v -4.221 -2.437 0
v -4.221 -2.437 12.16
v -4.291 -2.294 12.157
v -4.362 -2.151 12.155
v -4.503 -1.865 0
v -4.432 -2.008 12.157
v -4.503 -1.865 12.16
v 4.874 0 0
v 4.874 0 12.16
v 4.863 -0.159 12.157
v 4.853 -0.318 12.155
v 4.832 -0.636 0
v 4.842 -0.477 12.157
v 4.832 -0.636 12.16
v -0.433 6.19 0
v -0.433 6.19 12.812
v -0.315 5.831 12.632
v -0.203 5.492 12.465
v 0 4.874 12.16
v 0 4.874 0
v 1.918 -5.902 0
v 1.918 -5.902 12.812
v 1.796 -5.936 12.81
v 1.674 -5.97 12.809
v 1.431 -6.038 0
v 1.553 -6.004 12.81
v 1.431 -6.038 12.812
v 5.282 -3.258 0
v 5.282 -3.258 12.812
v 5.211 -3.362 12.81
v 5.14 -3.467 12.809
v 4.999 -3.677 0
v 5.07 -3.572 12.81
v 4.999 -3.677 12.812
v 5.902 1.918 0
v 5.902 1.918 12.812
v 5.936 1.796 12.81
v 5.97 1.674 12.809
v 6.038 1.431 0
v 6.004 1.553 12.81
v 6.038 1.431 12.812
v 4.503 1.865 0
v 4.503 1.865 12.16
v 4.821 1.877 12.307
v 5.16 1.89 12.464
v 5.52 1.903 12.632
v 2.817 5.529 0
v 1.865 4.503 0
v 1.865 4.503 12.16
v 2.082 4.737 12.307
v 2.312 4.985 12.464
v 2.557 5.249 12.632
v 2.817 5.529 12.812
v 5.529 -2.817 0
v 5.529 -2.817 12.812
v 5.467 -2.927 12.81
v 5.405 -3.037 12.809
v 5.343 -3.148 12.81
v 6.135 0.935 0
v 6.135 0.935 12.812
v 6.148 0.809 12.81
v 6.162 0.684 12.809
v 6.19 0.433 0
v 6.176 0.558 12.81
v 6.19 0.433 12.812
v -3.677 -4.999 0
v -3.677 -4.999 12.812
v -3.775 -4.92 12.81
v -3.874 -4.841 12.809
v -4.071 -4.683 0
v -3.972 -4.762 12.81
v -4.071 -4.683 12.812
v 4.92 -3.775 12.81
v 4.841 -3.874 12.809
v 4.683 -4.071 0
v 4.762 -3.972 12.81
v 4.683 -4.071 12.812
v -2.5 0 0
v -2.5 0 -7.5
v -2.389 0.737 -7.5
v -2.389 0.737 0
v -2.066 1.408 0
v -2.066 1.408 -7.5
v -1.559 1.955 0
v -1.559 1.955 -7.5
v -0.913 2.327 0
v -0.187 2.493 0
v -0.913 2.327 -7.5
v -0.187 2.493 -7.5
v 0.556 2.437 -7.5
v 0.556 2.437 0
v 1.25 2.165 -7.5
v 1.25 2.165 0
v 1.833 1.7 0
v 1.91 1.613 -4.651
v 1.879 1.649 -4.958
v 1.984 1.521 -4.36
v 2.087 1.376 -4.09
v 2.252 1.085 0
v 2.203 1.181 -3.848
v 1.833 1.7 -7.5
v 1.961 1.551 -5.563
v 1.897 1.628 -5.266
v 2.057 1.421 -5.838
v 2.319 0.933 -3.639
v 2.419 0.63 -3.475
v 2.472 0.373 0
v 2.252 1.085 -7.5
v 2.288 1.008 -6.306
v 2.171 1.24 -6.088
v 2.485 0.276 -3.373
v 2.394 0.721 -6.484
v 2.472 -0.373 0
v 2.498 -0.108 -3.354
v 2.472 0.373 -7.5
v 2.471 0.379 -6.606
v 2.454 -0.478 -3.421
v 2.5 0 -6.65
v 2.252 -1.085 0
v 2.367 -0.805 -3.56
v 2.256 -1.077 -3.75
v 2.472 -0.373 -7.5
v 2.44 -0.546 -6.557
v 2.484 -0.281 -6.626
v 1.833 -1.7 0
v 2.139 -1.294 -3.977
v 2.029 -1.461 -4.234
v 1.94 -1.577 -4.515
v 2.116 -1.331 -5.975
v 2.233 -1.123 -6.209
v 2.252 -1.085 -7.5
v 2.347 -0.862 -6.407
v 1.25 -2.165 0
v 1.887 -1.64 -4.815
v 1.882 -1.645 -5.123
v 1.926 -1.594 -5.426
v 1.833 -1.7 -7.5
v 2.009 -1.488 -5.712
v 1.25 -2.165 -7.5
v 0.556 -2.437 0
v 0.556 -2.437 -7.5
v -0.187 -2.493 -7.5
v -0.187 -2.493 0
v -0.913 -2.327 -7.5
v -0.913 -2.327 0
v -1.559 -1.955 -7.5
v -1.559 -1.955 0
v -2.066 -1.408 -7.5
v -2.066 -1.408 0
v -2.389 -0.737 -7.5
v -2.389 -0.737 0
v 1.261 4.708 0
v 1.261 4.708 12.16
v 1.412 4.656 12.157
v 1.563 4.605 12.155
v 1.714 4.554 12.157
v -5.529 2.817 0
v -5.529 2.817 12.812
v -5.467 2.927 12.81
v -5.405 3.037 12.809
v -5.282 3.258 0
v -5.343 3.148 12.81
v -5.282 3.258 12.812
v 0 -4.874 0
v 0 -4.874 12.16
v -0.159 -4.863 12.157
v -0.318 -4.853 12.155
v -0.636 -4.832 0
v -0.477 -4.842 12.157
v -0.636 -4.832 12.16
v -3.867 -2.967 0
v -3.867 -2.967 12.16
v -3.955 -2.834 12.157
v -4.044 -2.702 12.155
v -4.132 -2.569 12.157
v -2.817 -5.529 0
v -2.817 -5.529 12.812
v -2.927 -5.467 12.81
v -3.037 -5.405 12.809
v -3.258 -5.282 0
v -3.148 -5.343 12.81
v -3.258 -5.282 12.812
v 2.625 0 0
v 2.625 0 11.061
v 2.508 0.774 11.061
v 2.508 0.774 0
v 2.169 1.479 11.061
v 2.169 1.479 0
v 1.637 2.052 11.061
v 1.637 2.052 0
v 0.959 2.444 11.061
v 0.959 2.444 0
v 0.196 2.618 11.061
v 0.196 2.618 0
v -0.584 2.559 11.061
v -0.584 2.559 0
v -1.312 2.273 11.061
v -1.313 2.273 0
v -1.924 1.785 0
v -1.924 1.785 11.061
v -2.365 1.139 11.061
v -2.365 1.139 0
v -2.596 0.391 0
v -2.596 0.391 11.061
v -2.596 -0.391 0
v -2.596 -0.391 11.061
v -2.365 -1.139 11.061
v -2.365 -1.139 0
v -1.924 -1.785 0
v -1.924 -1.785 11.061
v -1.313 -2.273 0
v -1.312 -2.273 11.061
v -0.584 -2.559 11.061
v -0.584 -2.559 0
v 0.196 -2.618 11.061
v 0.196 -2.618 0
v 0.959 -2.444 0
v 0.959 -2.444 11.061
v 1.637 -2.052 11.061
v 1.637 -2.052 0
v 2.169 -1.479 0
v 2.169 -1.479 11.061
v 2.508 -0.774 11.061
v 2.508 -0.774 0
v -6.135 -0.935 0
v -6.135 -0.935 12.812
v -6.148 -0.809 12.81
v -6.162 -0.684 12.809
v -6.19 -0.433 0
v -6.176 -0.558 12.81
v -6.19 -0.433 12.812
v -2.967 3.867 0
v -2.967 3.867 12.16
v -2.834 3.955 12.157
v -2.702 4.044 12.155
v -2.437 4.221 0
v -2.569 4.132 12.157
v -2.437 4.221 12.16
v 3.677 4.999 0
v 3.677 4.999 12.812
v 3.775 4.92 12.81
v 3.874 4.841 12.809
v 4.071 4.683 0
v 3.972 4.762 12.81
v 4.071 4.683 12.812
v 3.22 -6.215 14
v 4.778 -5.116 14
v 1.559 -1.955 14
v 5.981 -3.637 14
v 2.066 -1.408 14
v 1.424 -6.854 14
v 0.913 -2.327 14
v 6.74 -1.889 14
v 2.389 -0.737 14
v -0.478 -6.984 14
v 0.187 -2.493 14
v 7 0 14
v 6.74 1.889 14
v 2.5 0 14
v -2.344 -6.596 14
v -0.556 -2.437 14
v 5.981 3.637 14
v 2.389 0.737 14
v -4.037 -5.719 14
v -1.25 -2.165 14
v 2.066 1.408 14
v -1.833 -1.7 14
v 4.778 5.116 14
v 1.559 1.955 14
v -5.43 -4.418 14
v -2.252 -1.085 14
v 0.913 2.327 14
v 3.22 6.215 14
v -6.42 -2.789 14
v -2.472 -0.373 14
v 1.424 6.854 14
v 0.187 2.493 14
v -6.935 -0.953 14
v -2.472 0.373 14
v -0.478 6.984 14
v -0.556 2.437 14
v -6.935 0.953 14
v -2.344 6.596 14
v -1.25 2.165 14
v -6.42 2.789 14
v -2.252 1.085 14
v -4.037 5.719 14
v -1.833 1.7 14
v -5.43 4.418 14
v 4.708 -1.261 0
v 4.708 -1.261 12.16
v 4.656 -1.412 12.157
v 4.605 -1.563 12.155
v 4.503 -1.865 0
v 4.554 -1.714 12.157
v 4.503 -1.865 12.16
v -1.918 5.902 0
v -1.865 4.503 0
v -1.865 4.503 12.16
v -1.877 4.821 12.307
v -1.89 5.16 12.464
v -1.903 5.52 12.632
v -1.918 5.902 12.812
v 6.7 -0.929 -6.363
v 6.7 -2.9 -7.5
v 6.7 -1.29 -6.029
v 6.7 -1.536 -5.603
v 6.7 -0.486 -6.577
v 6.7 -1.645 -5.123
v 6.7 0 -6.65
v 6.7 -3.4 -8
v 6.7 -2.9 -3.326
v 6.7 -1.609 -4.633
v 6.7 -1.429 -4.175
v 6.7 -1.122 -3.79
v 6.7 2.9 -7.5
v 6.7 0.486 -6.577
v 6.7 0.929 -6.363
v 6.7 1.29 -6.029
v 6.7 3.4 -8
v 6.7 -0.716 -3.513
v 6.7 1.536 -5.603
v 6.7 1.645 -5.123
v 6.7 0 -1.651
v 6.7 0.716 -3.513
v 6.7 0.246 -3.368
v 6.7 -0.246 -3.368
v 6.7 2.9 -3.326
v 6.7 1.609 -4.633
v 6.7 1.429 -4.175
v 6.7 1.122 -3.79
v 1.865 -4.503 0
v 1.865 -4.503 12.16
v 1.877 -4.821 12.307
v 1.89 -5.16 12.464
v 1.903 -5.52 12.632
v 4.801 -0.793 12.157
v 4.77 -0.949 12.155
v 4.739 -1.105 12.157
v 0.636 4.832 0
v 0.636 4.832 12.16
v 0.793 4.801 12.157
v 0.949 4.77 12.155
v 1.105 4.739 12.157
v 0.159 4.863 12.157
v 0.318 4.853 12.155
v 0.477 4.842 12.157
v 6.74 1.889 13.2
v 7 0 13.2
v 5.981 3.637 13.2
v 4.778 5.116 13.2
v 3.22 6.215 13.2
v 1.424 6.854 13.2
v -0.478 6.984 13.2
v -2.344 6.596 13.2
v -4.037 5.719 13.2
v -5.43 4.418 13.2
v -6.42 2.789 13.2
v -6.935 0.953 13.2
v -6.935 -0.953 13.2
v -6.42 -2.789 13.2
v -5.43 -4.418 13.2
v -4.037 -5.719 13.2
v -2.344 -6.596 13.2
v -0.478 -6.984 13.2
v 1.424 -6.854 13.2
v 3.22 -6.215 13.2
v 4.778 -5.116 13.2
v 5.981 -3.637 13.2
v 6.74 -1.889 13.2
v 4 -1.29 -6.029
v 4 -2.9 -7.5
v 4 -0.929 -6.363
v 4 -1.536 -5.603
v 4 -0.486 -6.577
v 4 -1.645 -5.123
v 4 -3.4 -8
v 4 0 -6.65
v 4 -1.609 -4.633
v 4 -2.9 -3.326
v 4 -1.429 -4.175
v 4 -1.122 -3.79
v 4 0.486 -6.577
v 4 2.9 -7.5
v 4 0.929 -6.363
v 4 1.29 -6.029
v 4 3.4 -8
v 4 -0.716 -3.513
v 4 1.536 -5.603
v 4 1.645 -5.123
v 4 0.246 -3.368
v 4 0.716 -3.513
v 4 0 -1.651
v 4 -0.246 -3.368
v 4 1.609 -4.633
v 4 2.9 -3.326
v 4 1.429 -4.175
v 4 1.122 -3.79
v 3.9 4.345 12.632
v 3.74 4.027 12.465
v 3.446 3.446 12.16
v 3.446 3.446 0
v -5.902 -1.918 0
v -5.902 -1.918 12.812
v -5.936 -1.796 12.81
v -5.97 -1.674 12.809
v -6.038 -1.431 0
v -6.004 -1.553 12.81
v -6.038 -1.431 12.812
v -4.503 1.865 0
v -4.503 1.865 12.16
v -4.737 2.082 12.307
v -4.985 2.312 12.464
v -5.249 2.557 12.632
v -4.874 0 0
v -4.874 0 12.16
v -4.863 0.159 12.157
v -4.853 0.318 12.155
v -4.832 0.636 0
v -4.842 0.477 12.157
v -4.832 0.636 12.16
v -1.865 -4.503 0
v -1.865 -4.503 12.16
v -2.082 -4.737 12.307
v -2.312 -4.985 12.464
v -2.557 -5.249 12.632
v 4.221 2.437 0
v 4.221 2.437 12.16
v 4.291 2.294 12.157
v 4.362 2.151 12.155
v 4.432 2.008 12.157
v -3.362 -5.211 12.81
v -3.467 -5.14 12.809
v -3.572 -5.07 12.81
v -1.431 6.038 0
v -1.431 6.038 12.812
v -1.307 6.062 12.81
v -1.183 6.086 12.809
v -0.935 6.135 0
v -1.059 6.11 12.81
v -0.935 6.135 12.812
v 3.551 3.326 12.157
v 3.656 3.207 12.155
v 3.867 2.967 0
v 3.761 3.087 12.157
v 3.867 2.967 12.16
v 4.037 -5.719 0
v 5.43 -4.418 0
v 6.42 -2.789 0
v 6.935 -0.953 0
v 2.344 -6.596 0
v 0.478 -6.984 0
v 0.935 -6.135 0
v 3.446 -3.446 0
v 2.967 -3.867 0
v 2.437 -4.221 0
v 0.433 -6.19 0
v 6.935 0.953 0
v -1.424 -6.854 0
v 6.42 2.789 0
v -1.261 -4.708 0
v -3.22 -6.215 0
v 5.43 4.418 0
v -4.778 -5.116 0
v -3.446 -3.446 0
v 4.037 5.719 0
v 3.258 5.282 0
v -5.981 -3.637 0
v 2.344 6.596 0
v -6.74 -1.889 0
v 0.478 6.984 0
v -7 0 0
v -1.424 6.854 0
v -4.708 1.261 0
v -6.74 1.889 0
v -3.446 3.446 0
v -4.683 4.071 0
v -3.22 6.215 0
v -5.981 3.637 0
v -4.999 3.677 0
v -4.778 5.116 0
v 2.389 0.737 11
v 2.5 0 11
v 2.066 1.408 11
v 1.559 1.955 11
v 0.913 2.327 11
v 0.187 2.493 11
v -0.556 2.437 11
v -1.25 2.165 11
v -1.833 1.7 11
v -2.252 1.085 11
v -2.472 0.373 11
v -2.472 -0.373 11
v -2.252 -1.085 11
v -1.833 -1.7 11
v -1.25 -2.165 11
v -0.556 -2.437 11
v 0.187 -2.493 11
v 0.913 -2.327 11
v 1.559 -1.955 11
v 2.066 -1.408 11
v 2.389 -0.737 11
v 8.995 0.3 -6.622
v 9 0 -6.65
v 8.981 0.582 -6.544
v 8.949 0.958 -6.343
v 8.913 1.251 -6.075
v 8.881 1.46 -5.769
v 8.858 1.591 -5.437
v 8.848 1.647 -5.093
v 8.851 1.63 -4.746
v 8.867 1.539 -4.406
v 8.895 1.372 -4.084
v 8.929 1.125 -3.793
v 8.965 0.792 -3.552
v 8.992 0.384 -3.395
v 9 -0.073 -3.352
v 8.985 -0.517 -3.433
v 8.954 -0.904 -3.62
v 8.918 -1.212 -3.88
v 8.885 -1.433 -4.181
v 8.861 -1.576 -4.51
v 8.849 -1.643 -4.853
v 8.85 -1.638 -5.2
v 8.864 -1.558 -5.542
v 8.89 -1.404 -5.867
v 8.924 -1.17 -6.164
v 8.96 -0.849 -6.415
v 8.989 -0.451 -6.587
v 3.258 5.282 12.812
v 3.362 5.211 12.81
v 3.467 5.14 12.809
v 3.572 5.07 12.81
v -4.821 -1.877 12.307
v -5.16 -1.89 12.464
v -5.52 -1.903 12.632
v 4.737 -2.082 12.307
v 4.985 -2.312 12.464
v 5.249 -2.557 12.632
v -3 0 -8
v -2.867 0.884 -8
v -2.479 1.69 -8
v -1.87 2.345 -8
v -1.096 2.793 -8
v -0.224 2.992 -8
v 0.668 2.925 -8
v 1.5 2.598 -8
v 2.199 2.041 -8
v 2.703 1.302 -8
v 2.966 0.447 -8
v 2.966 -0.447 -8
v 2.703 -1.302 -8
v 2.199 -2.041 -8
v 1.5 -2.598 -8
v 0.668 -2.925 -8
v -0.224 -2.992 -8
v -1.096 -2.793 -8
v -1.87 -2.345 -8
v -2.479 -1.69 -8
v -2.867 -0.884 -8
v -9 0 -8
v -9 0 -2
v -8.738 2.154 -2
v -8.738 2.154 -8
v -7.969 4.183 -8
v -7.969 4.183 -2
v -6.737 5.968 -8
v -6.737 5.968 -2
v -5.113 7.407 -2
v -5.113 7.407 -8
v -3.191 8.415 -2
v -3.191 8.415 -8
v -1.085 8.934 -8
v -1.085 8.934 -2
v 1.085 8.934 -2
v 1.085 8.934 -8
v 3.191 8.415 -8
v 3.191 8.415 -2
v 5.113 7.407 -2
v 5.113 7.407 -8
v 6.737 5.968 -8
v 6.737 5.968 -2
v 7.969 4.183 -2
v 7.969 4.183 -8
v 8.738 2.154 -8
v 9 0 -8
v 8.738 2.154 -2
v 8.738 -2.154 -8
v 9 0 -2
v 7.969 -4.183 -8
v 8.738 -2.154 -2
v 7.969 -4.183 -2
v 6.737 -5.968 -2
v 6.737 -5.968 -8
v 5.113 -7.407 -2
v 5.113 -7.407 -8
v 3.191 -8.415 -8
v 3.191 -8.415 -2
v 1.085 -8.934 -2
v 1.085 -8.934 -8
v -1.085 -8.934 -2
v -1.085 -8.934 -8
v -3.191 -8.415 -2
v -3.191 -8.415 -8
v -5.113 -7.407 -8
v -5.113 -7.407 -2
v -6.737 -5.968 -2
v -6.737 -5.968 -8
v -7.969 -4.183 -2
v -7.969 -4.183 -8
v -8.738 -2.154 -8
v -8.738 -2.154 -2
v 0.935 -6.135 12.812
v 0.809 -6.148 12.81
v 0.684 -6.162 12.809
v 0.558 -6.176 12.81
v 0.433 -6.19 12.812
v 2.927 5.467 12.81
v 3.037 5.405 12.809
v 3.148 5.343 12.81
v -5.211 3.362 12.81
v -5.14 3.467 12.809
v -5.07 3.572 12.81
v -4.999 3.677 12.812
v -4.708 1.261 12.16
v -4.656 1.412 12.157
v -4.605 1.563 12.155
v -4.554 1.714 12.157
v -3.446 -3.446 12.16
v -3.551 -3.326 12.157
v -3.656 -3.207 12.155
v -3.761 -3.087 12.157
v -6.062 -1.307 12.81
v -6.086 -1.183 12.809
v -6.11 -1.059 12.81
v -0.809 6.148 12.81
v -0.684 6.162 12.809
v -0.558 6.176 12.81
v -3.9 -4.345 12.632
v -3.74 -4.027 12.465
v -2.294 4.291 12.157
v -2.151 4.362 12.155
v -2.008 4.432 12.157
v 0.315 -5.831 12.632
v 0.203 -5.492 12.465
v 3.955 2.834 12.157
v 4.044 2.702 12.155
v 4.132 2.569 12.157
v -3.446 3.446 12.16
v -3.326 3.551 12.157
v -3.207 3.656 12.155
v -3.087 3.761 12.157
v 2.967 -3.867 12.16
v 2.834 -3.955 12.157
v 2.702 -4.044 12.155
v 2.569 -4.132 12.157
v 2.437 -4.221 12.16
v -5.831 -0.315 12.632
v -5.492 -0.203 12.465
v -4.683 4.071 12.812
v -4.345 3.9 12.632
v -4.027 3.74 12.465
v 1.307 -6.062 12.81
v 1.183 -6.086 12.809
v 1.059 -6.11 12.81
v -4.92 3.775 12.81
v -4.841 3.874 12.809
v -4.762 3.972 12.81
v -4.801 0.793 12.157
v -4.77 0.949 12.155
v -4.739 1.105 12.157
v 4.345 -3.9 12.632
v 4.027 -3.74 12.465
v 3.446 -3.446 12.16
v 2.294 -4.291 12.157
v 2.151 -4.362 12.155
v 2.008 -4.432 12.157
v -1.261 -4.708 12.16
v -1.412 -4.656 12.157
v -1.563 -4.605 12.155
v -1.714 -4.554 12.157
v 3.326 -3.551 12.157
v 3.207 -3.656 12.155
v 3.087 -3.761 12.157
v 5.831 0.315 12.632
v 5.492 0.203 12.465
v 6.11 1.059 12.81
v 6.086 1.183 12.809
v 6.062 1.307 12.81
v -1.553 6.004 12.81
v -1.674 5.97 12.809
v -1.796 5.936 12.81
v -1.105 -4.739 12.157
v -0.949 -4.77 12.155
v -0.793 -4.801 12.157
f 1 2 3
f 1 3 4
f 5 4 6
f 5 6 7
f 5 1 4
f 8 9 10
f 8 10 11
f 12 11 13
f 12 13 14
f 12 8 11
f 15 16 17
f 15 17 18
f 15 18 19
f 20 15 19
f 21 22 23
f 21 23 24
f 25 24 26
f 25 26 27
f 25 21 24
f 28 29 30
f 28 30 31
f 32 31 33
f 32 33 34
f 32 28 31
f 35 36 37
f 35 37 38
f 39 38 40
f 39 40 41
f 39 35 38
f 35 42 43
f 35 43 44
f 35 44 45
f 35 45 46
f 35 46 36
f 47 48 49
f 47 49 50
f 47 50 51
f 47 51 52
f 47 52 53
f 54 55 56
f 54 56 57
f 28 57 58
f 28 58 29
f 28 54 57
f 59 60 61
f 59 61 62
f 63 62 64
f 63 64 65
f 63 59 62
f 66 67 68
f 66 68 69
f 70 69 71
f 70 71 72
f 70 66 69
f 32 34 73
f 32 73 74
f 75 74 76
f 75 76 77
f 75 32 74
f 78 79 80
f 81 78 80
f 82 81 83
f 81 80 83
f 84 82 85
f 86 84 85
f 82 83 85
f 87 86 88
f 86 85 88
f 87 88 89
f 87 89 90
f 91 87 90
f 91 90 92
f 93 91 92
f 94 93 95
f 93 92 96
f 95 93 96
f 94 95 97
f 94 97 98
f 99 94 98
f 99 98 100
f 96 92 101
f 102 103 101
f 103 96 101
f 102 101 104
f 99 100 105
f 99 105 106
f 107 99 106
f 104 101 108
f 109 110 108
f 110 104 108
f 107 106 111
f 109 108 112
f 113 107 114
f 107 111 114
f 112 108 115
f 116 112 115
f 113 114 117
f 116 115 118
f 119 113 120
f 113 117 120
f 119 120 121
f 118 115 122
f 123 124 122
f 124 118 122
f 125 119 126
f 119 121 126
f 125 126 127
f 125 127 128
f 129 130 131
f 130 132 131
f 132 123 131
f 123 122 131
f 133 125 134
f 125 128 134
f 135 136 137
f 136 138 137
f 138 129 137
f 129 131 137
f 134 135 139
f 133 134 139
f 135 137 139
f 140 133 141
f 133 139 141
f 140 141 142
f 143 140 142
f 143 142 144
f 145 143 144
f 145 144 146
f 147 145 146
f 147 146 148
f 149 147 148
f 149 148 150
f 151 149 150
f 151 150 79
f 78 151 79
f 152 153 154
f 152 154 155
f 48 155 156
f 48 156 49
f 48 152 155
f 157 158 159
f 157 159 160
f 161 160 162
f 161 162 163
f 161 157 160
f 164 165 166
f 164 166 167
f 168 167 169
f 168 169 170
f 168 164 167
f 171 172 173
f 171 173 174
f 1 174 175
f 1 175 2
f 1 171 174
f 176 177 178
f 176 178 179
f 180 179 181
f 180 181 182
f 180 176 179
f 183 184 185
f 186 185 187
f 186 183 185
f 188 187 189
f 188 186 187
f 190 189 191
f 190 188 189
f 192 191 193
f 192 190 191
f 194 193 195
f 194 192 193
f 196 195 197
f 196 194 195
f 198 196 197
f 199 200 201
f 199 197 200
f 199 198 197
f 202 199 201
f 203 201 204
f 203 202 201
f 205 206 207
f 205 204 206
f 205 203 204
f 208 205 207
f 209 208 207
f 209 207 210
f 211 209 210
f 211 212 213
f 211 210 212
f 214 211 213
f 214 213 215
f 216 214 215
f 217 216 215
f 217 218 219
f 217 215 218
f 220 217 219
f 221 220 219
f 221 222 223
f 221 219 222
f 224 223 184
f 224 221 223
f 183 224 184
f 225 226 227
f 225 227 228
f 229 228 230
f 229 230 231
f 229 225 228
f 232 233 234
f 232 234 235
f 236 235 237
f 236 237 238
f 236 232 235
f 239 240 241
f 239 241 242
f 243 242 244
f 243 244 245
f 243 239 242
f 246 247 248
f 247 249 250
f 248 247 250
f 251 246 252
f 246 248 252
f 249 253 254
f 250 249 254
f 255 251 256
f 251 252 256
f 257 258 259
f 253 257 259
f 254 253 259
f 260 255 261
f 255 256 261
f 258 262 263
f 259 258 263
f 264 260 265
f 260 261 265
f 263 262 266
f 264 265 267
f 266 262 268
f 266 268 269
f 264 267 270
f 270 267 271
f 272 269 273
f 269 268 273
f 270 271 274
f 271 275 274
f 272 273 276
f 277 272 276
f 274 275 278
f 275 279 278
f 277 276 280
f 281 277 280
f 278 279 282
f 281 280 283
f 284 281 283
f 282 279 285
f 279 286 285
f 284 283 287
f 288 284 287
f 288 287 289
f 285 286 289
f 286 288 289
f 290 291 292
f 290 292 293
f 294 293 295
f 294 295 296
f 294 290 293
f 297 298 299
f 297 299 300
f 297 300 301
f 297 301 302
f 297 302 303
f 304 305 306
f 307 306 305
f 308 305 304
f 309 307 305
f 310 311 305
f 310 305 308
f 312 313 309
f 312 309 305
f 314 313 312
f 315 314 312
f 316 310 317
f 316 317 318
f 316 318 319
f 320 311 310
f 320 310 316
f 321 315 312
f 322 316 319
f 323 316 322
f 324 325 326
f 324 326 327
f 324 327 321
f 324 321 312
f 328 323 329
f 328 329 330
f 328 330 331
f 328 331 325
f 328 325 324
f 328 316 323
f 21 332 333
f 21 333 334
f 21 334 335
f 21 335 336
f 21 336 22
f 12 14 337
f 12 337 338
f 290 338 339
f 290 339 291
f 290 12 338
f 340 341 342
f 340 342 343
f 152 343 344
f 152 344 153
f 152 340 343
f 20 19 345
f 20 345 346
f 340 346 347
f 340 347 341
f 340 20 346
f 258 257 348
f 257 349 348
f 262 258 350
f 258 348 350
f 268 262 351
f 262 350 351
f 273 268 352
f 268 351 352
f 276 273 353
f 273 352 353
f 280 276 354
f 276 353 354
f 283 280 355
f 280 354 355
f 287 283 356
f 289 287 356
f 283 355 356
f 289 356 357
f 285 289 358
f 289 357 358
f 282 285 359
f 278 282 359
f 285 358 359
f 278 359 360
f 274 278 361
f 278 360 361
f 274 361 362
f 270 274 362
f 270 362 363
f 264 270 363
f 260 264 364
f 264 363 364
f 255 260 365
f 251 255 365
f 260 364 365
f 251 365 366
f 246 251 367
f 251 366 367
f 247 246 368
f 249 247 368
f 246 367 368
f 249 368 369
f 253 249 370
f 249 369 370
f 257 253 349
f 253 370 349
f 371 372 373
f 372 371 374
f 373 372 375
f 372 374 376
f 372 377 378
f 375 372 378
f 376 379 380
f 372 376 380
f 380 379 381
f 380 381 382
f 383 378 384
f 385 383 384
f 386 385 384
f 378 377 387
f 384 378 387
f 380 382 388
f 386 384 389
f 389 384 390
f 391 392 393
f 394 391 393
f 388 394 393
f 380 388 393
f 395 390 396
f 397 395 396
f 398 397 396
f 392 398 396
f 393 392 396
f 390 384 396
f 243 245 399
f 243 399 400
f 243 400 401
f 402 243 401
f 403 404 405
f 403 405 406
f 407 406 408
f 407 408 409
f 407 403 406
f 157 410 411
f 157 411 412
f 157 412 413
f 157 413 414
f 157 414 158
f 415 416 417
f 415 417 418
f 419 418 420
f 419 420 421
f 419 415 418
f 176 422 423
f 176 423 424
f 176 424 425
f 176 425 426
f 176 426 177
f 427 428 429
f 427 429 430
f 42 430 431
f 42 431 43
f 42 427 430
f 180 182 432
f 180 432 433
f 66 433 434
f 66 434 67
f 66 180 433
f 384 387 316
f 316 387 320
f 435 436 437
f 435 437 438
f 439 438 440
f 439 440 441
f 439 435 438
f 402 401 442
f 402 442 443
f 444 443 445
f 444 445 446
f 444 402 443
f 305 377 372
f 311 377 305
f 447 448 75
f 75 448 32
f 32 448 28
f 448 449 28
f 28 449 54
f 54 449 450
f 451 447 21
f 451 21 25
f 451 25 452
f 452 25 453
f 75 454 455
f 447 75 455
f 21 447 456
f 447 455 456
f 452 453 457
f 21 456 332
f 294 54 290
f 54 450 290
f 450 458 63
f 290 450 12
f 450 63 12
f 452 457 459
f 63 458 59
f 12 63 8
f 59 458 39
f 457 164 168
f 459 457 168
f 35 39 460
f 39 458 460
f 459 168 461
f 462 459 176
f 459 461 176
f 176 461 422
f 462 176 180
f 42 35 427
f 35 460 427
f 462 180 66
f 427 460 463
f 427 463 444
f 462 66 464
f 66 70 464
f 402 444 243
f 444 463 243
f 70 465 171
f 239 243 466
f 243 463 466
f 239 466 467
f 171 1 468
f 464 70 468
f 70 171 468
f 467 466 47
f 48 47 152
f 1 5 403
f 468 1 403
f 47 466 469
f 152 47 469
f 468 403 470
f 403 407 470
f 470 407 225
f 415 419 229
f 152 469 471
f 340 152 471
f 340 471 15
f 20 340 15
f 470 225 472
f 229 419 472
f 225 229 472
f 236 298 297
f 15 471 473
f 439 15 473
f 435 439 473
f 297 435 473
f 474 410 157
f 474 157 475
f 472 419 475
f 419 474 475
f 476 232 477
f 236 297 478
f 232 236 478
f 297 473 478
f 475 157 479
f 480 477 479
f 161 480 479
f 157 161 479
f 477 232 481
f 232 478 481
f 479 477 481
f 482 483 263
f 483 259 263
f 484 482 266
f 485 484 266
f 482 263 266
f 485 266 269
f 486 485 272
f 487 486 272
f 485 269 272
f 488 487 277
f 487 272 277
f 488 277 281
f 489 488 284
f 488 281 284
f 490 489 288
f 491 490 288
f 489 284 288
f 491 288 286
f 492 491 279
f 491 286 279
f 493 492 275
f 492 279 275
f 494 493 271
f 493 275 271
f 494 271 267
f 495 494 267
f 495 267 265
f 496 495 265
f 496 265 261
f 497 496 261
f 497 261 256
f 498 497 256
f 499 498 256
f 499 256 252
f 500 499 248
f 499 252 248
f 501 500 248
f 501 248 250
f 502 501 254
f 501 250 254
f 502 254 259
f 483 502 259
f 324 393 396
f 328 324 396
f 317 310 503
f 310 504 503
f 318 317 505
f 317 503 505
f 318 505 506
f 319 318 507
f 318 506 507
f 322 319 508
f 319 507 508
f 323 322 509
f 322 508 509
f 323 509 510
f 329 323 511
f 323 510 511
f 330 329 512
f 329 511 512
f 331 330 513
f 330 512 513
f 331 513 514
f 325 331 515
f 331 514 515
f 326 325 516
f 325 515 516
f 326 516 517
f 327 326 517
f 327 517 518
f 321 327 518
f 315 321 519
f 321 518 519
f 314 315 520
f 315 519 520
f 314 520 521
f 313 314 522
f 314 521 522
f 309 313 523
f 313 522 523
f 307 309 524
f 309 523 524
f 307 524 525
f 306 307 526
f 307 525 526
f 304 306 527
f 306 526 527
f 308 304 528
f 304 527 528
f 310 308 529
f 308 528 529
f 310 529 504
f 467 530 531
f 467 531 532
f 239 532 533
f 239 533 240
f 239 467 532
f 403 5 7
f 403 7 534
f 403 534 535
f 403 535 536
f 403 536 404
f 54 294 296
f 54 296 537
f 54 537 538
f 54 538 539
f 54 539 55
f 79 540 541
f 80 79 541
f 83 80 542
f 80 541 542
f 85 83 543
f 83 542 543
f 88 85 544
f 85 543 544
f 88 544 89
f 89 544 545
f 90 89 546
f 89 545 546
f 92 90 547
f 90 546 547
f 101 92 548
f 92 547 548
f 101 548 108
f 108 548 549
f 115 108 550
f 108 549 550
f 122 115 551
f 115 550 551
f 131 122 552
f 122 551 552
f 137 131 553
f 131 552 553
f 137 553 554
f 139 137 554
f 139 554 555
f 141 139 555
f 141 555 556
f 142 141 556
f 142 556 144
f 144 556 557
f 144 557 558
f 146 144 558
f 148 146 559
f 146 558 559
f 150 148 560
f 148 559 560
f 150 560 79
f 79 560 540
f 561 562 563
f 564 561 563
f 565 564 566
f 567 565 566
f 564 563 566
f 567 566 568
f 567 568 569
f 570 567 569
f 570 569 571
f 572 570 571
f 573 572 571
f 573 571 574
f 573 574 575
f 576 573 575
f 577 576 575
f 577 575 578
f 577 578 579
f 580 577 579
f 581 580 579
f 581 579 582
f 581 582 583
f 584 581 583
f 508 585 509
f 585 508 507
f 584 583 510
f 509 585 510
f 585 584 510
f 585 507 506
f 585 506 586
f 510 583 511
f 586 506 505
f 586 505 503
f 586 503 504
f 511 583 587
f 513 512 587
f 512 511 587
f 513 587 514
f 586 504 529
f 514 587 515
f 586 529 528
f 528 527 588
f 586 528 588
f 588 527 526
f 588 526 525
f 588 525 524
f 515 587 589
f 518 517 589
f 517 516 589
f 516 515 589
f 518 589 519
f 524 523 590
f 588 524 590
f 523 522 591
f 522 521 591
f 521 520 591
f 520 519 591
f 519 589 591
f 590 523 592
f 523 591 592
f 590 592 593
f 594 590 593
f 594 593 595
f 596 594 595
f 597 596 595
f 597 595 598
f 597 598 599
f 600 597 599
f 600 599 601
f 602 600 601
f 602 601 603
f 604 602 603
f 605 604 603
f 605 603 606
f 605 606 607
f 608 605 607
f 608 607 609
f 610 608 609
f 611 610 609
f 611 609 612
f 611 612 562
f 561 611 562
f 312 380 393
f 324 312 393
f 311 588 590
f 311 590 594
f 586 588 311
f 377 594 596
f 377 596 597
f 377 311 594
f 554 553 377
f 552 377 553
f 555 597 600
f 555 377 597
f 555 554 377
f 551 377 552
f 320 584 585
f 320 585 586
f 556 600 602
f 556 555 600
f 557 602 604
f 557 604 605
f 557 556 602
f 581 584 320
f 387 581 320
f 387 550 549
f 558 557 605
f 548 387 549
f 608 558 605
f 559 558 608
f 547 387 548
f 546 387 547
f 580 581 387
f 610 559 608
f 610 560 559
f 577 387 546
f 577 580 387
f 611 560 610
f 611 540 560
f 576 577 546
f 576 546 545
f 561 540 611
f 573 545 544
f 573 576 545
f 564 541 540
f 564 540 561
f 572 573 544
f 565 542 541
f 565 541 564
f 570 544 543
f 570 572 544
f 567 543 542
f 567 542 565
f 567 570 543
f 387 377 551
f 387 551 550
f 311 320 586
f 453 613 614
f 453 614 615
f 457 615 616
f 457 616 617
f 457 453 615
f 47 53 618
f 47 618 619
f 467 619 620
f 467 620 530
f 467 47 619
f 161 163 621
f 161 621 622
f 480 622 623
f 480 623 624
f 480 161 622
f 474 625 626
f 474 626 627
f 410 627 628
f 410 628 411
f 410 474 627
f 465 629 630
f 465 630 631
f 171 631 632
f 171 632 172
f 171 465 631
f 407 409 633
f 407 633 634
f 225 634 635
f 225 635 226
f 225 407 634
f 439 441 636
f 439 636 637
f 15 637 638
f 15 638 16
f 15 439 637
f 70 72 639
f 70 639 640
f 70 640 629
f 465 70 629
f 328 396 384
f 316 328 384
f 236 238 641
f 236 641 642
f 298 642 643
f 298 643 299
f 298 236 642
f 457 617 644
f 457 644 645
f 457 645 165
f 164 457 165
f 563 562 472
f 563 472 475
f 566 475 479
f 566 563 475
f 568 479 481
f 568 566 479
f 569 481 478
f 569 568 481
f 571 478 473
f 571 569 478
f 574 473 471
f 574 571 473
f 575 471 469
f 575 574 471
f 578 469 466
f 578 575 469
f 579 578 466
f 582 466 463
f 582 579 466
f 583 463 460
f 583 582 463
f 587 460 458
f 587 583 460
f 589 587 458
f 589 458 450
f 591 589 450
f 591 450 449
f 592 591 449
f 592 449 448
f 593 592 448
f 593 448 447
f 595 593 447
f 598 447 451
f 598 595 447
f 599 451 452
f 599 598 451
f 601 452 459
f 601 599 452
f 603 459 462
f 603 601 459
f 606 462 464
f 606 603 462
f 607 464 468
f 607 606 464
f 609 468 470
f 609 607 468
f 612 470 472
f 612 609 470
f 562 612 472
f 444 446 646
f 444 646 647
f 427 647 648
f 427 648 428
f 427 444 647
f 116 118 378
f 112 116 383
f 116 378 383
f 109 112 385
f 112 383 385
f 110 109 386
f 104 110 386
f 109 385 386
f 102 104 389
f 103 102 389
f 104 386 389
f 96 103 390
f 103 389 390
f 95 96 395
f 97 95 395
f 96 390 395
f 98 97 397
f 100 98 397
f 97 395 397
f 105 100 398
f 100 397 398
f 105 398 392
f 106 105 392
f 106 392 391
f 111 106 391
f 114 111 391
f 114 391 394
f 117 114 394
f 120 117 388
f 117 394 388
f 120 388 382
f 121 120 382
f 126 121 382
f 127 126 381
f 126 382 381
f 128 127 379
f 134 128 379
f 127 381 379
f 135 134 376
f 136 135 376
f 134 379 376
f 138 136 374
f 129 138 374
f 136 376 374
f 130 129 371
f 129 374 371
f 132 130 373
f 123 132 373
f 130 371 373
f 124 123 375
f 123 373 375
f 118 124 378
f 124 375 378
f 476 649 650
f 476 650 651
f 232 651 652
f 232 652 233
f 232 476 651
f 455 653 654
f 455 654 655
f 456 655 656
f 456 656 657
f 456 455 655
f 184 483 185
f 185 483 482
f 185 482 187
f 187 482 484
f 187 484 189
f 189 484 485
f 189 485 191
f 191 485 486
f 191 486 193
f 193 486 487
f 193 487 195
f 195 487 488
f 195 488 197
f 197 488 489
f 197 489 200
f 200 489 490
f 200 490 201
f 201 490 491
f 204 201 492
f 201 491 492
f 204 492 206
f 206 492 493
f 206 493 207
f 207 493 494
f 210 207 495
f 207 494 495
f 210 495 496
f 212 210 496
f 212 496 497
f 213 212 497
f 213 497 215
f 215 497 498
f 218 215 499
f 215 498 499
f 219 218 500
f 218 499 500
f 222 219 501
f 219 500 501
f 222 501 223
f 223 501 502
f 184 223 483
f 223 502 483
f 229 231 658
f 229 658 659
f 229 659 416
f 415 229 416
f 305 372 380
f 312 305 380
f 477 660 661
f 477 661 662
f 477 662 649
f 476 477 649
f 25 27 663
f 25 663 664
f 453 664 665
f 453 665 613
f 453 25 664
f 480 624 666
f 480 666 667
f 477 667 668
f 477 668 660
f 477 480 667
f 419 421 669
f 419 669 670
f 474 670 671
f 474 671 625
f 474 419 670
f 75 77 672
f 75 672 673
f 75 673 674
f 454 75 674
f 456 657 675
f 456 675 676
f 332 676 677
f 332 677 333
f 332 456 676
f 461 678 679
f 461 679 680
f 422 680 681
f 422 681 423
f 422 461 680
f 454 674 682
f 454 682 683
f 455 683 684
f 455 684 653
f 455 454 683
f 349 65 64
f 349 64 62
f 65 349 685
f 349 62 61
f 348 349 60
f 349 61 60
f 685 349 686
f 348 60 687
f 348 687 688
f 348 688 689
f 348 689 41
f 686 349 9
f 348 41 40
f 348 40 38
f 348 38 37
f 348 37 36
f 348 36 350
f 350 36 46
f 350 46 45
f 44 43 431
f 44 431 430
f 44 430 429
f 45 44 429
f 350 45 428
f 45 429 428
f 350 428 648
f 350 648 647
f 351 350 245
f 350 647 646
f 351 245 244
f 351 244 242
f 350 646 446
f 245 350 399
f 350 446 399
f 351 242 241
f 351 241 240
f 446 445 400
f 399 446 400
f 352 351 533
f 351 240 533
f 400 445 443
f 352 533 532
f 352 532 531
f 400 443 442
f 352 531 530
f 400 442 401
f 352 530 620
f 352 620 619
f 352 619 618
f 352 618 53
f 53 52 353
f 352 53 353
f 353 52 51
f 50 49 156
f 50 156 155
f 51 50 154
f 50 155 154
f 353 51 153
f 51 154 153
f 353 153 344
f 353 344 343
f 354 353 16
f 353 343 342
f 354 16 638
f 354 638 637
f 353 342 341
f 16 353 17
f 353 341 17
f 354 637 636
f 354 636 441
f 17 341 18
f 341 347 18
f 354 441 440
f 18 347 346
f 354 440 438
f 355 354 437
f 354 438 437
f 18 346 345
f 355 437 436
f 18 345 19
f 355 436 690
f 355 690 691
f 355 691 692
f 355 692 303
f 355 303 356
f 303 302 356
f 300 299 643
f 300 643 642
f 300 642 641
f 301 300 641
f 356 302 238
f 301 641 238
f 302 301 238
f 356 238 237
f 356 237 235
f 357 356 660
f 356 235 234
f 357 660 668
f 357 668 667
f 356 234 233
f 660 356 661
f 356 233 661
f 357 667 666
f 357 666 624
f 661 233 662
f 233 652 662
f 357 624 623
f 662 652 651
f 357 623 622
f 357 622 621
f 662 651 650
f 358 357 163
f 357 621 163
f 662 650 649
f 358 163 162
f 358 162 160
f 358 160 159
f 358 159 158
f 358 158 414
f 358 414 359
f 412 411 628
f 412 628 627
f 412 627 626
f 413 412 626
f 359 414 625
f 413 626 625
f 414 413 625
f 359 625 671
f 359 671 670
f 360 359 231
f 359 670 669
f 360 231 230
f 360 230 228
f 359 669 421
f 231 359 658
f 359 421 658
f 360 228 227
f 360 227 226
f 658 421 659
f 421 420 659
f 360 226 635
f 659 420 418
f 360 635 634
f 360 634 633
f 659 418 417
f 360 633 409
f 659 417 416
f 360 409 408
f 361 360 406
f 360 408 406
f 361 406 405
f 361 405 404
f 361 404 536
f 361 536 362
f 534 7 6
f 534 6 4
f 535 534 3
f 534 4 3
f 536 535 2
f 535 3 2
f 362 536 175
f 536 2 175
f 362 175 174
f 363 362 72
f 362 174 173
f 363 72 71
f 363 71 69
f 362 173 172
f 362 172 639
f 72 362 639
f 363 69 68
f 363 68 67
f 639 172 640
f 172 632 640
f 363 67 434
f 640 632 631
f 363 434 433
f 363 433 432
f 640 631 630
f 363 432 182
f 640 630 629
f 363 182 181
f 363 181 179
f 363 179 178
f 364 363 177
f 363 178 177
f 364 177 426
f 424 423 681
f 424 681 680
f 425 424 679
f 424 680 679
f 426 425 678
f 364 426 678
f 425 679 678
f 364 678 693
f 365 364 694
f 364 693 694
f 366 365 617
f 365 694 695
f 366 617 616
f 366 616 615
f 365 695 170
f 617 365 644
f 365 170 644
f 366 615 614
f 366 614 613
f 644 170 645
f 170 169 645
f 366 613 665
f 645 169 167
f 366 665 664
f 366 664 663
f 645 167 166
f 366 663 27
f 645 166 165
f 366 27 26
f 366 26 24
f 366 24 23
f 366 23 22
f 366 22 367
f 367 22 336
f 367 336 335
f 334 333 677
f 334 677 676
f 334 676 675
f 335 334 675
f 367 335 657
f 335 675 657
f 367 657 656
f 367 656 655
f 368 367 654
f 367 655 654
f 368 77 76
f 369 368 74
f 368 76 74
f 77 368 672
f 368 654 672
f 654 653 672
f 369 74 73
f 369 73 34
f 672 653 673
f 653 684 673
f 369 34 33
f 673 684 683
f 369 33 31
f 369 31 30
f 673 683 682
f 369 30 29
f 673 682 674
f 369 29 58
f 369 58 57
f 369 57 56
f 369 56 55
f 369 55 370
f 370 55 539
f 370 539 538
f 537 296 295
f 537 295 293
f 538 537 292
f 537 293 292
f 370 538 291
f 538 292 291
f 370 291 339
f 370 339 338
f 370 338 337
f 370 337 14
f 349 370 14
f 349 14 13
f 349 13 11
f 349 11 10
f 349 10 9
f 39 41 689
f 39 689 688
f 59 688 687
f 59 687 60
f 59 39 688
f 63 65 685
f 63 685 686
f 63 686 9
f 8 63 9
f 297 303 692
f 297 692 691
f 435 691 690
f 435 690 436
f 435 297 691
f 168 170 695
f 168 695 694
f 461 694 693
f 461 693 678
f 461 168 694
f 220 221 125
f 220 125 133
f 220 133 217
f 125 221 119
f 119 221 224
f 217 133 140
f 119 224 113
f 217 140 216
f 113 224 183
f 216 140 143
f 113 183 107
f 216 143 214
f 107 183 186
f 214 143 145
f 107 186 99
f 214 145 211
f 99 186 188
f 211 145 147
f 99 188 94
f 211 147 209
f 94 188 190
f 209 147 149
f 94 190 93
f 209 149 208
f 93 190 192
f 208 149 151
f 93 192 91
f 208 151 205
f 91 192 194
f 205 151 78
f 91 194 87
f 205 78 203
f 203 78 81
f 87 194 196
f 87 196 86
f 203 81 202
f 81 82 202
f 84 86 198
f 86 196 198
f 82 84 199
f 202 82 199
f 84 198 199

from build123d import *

# Parameters (mm, degrees)
SKETCH2_R           = 2.625
BOSS_EXTRUDE1_DEPTH = 14
SKETCH3_R           = 9
BOSS_EXTRUDE2_DEPTH = 8
SKETCH4_R           = 2.5
CUT_EXTRUDE1_DEPTH  = 23
CHAMFER1_SIZE       = 2
CUT_EXTRUDE2_DEPTH  = 2.7
CUT_EXTRUDE3_REACH  = 20
SKETCH7_R           = 1.65
CHAMFER2_SIZE       = 0.5
CHAMFER3_SIZE       = 0.5


with BuildPart() as part:
    # Sketch2 → Boss-Extrude1 (new body)
    with BuildSketch(Plane.XY):
        Polygon((4.873707771, 0), (4.832012177, -0.636146486), (4.707640171, -1.261407971), (4.502718925, -1.865087032), (5.52904892, -2.817190886), (5.281517029, -3.257688046), (4.998967171, -3.676585913), (4.683272839, -4.071106911), (3.44623208, -3.44623208), (2.966924906, -3.866571903), (2.436853886, -4.2207551), (1.865087032, -4.502718925), (1.917572975, -5.901682854), (1.431063056, -6.038129807), (0.935064673, -6.134541988), (0.432866603, -6.190280914), (0, -4.873707771), (-0.636146486, -4.832012177), (-1.261407971, -4.707640171), (-1.865087032, -4.502718925), (-2.817190886, -5.52904892), (-3.257688046, -5.281517029), (-3.676585913, -4.998967171), (-4.071106911, -4.683272839), (-3.44623208, -3.44623208), (-3.866571903, -2.966924906), (-4.2207551, -2.436853886), (-4.502718925, -1.865087032), (-5.901682854, -1.917572975), (-6.038129807, -1.431063056), (-6.134541988, -0.935064673), (-6.190280914, -0.432866603), (-4.873707771, 0), (-4.832012177, 0.636146486), (-4.707640171, 1.261407971), (-4.502718925, 1.865087032), (-5.52904892, 2.817190886), (-5.281517029, 3.257688046), (-4.998967171, 3.676585913), (-4.683272839, 4.071106911), (-3.44623208, 3.44623208), (-2.966924906, 3.866571903), (-2.436853886, 4.2207551), (-1.865087032, 4.502718925), (-1.917572975, 5.901682854), (-1.431063056, 6.038129807), (-0.935064673, 6.134541988), (-0.432866603, 6.190280914), (0, 4.873707771), (0.636146486, 4.832012177), (1.261407971, 4.707640171), (1.865087032, 4.502718925), (2.817190886, 5.52904892), (3.257688046, 5.281517029), (3.676585913, 4.998967171), (4.071106911, 4.683272839), (3.44623208, 3.44623208), (3.866571903, 2.966924906), (4.2207551, 2.436853886), (4.502718925, 1.865087032), (5.901682854, 1.917572975), (6.038129807, 1.431063056), (6.134541988, 0.935064673), (6.190280914, 0.432866603), align=None)
        Circle(SKETCH2_R, mode=Mode.SUBTRACT)
    extrude(amount=BOSS_EXTRUDE1_DEPTH)

    # Sketch3 → Boss-Extrude2 (add)
    with BuildSketch(Plane(origin=(0, 0, 0), x_dir=(-1, 0, 0), z_dir=(0, 0, -1))):
        Circle(SKETCH3_R)
    extrude(amount=BOSS_EXTRUDE2_DEPTH)

    # Sketch4 → Cut-Extrude1 (cut, through all)
    with BuildSketch(Plane(origin=(0, 0, -8), x_dir=(-1, 0, 0), z_dir=(0, 0, -1))):
        Circle(SKETCH4_R)
    extrude(amount=-CUT_EXTRUDE1_DEPTH, mode=Mode.SUBTRACT)

    # Sketch5 → Revolve1 (revolve)
    with BuildSketch(Plane(origin=(0, 0, 0), x_dir=(1, 0, 0), z_dir=(0, 1, 0))):
        Polygon((2.5, -14), (7, -14), (7, -13.2), (2.5, -11), align=None)
    revolve(axis=Axis((0, 0, 0), (0, 0, 1)))

    # Chamfer1
    chamfer1_edges = [part.edges().sort_by_distance(p)[0] for p in [
        (9, 0, 0),
    ]]
    chamfer(chamfer1_edges, length=CHAMFER1_SIZE)

    # Sketch6 → Cut-Extrude2 (cut)
    with BuildSketch(Plane(origin=(4, 0, 0), x_dir=(0, 0, -1), z_dir=(1, 0, 0))):
        Polygon((8, 2.9), (8, -2.9), (3.325684219, -2.9), (1.651368439, 0), (3.325684219, 2.9), align=None)
    extrude(amount=CUT_EXTRUDE2_DEPTH, mode=Mode.SUBTRACT)

    # Cut-Extrude3: up to this face of the body
    cut_extrude3_end = part.part.faces().sort_by_distance((2.5, 0, -4))[0]
    # Sketch7 → Cut-Extrude3 (cut, up to the picked face)
    with BuildSketch(Plane(origin=(9, 0, 0), x_dir=(0, 0, -1), z_dir=(1, 0, 0)), mode=Mode.PRIVATE) as cut_extrude3_sk1:
        with Locations((5, 0)):
            Circle(SKETCH7_R)
    cut_extrude3_tool1 = split(extrude(cut_extrude3_sk1.sketch, amount=-CUT_EXTRUDE3_REACH, mode=Mode.PRIVATE), bisect_by=cut_extrude3_end, keep=Keep.BOTH, mode=Mode.PRIVATE)
    add(cut_extrude3_tool1.solids().sort_by_distance((9, 0, -5))[0], mode=Mode.SUBTRACT)

    # Chamfer2
    chamfer2_edges = [part.edges().sort_by_distance(p)[0] for p in [
        (5.35, 2.9, -8),
        (5.35, -2.9, -8),
    ]]
    chamfer(chamfer2_edges, length=CHAMFER2_SIZE)

    # Chamfer3
    chamfer3_edges = [part.edges().sort_by_distance(p)[0] for p in [
        (2.5, 0, -8),
    ]]
    chamfer(chamfer3_edges, length=CHAMFER3_SIZE)


solid = part.part
